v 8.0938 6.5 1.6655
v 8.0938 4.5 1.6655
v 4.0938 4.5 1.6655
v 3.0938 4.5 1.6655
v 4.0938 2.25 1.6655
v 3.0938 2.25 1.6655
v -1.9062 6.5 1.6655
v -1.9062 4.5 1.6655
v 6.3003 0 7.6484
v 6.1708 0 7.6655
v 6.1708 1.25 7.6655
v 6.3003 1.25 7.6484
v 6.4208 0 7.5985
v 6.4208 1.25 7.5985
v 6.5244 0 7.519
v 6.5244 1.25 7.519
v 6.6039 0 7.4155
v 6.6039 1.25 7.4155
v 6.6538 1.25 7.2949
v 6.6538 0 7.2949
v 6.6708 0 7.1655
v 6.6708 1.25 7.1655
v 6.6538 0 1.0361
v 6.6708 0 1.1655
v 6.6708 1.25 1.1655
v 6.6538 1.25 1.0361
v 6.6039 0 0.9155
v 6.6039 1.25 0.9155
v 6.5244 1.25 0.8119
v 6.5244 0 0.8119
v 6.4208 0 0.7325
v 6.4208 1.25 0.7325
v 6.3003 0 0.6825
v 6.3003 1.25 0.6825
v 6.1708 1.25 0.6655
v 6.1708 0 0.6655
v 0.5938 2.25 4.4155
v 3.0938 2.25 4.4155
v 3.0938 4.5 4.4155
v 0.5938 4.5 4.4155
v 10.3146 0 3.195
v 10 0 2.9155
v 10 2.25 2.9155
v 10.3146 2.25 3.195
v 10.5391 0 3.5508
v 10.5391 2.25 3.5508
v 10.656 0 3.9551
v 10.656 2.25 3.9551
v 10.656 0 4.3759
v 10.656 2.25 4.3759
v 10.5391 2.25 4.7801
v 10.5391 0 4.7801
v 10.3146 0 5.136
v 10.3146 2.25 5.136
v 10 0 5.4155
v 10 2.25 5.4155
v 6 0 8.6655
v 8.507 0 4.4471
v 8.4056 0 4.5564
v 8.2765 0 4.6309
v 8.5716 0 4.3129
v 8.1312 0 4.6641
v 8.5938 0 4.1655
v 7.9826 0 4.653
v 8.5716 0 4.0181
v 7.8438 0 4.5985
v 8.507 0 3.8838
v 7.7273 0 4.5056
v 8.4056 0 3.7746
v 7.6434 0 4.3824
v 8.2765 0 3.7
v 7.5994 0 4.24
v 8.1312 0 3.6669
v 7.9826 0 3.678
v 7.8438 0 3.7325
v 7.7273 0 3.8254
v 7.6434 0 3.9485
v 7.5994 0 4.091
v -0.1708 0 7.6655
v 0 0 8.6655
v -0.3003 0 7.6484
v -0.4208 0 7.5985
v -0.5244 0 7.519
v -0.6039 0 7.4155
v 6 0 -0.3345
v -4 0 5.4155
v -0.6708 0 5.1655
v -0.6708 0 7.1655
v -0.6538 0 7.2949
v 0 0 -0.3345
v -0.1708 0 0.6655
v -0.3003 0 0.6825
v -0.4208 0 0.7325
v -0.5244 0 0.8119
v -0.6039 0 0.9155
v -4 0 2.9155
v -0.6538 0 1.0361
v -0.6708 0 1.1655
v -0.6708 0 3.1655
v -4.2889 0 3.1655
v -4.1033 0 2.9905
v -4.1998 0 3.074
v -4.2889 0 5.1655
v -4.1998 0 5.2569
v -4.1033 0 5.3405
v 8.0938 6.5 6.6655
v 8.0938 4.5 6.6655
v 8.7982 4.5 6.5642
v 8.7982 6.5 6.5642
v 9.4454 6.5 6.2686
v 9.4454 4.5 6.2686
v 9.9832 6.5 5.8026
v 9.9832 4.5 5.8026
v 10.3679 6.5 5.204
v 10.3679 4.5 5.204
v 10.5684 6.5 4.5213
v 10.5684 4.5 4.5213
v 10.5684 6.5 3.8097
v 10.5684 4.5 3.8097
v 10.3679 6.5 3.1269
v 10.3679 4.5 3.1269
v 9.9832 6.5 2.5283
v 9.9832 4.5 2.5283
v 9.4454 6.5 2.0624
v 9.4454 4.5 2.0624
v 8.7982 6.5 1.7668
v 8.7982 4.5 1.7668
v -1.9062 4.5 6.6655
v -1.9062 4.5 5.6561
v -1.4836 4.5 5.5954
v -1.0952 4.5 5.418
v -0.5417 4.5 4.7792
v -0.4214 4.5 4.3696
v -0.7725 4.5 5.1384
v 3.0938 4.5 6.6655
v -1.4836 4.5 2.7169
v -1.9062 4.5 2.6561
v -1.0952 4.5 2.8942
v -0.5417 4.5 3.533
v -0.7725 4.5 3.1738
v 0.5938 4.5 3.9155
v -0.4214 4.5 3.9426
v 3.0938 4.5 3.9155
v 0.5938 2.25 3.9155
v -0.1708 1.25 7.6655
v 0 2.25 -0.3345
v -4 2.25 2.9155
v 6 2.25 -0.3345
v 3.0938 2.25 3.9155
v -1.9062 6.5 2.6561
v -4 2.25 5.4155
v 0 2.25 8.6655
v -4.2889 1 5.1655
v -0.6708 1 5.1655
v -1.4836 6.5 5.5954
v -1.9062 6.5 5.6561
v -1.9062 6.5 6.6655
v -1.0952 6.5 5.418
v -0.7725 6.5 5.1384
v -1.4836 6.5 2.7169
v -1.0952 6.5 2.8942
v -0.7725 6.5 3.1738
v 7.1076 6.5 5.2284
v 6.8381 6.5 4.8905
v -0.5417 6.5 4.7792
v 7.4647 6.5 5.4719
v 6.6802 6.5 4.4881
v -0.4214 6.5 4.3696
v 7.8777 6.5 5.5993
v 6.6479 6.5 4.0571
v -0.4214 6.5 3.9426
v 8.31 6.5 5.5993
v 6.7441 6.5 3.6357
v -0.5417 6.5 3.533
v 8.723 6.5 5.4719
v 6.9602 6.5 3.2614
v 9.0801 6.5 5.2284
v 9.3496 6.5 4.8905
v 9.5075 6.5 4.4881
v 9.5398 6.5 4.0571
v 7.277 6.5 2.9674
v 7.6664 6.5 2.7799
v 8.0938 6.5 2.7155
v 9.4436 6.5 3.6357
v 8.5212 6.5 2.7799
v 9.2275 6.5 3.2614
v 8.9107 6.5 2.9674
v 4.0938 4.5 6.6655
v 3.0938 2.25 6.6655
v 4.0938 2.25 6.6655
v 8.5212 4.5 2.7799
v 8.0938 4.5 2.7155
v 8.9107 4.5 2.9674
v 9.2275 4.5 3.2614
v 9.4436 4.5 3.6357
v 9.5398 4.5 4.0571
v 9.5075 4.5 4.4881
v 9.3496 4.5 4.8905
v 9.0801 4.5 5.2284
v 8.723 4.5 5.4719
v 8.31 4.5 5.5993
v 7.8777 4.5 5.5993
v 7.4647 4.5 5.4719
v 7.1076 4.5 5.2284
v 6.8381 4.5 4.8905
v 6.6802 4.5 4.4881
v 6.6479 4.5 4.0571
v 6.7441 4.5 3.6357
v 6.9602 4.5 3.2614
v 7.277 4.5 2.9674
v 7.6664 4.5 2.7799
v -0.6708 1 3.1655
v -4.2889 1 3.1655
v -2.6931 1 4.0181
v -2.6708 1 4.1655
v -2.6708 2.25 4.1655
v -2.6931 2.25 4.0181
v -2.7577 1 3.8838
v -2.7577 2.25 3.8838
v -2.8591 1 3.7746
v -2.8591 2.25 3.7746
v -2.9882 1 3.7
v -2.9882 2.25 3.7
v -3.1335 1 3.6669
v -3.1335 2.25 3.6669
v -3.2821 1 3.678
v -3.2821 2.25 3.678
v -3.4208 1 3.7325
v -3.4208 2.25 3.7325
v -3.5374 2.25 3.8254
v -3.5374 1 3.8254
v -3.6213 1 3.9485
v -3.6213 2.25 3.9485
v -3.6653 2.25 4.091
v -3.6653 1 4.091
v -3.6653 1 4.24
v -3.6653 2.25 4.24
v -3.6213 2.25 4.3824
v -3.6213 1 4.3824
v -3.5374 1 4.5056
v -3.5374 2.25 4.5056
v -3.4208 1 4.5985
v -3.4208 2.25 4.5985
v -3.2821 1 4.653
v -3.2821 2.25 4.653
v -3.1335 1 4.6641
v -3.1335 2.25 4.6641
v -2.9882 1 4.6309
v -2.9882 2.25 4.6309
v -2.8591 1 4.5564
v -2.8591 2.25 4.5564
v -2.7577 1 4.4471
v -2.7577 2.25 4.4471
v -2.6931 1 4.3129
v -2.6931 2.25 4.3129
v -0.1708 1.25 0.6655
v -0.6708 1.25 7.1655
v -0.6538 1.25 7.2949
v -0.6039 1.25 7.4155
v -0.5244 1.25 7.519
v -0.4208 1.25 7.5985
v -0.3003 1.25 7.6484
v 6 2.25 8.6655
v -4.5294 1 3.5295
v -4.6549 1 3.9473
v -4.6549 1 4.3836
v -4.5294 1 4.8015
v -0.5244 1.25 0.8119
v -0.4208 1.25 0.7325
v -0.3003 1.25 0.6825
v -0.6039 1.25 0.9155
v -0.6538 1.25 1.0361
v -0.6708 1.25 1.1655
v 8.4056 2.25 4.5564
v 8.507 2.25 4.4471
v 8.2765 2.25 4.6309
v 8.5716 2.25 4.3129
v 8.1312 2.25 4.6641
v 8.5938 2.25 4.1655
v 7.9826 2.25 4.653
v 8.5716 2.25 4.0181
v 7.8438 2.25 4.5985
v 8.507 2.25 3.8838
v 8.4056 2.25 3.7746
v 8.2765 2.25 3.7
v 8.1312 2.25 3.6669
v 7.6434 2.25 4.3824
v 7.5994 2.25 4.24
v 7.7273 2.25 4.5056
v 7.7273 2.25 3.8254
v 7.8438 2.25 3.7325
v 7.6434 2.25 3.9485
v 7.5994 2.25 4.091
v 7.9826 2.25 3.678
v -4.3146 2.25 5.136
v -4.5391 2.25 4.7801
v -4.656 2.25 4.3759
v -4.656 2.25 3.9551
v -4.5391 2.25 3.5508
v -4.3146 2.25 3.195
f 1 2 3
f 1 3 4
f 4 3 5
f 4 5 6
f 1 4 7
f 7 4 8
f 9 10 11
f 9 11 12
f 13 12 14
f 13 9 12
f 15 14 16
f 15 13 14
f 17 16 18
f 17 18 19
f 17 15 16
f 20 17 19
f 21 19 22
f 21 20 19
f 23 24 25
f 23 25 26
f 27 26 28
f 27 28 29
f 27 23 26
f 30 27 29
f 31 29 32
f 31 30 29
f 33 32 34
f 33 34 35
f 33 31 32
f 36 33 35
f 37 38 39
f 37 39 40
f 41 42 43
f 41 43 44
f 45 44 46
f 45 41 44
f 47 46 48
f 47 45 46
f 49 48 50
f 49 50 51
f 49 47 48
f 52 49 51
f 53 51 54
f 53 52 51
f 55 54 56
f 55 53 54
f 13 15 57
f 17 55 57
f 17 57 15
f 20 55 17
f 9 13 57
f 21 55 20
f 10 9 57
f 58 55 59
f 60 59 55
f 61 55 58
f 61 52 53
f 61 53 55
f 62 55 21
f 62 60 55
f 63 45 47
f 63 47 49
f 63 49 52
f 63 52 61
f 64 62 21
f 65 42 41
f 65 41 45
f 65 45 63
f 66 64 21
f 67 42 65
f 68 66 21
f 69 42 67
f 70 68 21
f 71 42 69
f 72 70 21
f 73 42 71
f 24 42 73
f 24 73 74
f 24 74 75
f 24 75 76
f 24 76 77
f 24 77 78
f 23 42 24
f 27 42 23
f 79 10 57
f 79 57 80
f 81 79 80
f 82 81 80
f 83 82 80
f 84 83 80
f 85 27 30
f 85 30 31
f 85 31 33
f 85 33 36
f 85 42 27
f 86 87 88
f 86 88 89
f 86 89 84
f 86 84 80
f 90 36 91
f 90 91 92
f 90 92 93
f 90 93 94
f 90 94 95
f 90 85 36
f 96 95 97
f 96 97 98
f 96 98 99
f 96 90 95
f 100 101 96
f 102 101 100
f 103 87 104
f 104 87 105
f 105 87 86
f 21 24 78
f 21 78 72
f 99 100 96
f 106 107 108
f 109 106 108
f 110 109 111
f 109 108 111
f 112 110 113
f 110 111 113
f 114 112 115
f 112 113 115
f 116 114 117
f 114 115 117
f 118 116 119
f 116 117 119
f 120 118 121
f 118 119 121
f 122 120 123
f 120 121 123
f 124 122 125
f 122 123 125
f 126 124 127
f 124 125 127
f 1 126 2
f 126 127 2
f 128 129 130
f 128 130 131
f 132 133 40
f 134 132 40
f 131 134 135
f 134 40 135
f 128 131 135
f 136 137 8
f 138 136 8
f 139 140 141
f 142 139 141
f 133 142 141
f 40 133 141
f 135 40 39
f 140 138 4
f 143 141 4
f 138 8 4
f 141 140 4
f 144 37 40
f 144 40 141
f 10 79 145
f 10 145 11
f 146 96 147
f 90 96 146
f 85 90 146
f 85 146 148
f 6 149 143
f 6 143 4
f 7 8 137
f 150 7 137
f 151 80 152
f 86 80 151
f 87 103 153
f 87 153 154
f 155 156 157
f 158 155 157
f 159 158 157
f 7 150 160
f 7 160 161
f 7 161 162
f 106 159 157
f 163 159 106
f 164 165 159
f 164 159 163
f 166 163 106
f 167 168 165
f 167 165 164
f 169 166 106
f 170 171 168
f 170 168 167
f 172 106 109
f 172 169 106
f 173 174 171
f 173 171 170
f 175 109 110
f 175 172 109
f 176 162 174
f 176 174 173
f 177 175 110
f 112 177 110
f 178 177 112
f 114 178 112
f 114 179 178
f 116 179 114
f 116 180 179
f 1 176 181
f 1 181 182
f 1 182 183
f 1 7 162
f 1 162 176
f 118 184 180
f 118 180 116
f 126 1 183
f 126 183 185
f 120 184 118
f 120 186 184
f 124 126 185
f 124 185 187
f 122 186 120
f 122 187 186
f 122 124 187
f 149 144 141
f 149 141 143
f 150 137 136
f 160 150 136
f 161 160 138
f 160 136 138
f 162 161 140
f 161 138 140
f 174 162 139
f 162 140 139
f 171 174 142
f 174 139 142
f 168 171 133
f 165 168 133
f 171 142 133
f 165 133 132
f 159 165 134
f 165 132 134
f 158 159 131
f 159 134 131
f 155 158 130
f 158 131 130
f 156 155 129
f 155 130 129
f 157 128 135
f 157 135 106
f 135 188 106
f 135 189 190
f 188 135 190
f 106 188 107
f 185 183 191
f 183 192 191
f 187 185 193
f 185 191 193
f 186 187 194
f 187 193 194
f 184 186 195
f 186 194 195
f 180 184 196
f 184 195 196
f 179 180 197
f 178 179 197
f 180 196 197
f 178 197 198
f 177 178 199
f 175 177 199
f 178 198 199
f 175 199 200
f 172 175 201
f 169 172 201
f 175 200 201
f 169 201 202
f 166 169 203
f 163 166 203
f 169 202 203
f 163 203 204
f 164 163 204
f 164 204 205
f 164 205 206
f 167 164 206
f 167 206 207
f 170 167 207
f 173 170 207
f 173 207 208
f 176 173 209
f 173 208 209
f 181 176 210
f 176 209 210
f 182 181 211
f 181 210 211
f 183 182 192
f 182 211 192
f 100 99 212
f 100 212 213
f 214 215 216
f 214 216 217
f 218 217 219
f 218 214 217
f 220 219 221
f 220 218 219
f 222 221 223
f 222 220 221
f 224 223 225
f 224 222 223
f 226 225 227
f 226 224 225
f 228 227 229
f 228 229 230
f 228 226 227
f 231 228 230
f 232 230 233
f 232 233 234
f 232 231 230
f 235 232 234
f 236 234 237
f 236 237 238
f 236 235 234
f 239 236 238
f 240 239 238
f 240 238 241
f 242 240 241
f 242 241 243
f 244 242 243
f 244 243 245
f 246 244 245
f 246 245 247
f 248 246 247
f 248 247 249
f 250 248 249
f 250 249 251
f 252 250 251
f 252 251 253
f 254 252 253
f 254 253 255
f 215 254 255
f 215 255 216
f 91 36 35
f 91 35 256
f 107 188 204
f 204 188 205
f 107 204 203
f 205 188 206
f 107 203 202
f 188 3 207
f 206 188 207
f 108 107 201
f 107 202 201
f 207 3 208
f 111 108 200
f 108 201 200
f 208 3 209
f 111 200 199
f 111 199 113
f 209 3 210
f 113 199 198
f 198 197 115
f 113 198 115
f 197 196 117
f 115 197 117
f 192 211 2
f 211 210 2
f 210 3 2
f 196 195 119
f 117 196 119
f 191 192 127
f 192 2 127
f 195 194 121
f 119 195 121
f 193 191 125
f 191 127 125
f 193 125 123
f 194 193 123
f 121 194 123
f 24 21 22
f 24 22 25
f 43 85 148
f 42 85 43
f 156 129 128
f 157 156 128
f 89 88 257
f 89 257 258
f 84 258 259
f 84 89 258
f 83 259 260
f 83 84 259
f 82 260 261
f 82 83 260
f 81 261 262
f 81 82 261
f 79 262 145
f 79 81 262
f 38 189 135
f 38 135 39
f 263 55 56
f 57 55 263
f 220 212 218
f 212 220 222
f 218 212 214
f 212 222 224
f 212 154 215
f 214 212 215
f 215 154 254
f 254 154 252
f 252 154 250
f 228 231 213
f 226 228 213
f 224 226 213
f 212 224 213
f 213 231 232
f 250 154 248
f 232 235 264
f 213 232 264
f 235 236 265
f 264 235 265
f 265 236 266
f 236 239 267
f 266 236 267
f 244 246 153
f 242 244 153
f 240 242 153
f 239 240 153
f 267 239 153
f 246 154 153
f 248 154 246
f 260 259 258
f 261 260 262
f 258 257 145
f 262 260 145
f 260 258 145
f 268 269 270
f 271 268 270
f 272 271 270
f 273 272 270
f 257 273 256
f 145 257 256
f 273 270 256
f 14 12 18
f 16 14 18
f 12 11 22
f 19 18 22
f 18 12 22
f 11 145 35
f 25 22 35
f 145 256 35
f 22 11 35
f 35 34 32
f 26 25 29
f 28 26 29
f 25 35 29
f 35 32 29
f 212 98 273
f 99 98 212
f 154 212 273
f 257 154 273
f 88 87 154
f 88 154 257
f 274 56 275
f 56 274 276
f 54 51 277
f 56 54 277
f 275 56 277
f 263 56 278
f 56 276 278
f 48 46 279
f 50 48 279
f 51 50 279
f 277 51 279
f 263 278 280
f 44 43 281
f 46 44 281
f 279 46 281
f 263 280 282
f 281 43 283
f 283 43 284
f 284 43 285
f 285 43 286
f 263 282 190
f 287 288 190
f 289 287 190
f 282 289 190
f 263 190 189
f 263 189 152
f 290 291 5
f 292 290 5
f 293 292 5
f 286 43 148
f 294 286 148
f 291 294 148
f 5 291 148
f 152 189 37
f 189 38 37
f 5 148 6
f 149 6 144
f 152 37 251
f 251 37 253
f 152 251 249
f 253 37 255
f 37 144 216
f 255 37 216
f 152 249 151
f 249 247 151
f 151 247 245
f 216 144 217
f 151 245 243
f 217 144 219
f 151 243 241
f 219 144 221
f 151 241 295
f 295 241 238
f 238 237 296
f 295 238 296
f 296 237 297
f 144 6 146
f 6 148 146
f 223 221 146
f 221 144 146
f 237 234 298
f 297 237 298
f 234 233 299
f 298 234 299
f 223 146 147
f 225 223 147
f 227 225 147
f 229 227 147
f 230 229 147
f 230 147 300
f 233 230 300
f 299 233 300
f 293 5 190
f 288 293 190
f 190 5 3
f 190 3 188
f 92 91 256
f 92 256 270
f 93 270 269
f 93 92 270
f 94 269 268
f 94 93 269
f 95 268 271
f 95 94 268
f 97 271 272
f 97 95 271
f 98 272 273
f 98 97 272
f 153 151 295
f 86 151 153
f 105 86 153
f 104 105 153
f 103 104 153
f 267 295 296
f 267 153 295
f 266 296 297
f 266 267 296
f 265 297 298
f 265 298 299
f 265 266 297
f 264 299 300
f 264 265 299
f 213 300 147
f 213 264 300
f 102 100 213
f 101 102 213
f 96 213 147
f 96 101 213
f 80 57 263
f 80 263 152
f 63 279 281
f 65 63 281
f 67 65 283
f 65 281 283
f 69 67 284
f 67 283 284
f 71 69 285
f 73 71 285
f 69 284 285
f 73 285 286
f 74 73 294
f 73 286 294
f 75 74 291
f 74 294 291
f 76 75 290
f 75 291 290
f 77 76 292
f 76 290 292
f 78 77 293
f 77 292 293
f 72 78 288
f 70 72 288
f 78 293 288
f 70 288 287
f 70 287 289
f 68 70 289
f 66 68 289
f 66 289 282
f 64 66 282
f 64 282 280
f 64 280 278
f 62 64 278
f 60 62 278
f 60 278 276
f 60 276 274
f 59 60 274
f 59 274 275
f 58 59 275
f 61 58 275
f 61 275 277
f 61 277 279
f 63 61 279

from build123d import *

# Parameters (mm, degrees)
SKETCH1_R               = 0.5
BOSS_EXTRUDE1_DEPTH     = 2.25
CUT_EXTRUDE3_DEPTH      = 1
CUT_EXTRUDE4_DEPTH      = 1.25
BOSS_EXTRUDE2_DEPTH     = 2.25
SKETCH7_R               = 1
BOSS_EXTRUDE3_DEPTH     = 2
SKETCH8_R               = 0.5
CUT_EXTRUDE5_DEPTH      = 3
M3_5_TAPPED_HOLE1_D     = 2.9
M3_5_TAPPED_HOLE1_DEPTH = 2
M3_5_TAPPED_HOLE1_TIP   = 0.871247898


with BuildPart() as part:
    # Sketch1 → Boss-Extrude1 (new body)
    with BuildSketch(Plane(origin=(0, 0, -0.343889451), x_dir=(1, 0, 0), z_dir=(0, 1, 0))):
        with BuildLine():
            Line((0, -0.009375659), (6, -0.009375659))
            Line((6, -0.009375659), (10, -3.259375659))
            ThreePointArc((10, -3.259375659), (10.670843802, -4.509375659), (10, -5.759375659))
            Line((10, -5.759375659), (6, -9.009375659))
            Line((6, -9.009375659), (0, -9.009375659))
            Line((0, -9.009375659), (-4, -5.759375659))
            ThreePointArc((-4, -5.759375659), (-4.670843802, -4.509375659), (-4, -3.259375659))
            Line((-4, -3.259375659), (0, -0.009375659))
        make_face()
        with Locations((-3.170843802, -4.509375659)):
            Circle(SKETCH1_R, mode=Mode.SUBTRACT)
    extrude(amount=BOSS_EXTRUDE1_DEPTH)

    # Sketch4 → Cut-Extrude3 (cut)
    with BuildSketch(Plane.XZ):
        with BuildLine():
            Line((-4.288877791, 5.165486209), (-0.670843802, 5.165486209))
            Line((-0.670843802, 5.165486209), (-0.670843802, 3.165486209))
            Line((-0.670843802, 3.165486209), (-4.288877791, 3.165486209))
            ThreePointArc((-4.288877791, 3.165486209), (-4.670843802, 4.165486209), (-4.288877791, 5.165486209))
        make_face()
    extrude(amount=-CUT_EXTRUDE3_DEPTH, mode=Mode.SUBTRACT)

    # Sketch5 → Cut-Extrude4 (cut)
    with BuildSketch(Plane(origin=(0, 0, 0), x_dir=(-1, 0, 0), z_dir=(0, -1, 0))):
        with BuildLine():
            Line((0.170843802, -7.665486209), (-6.170843802, -7.665486209))
            ThreePointArc((-6.170843802, -7.665486209), (-6.524397193, -7.519039599), (-6.670843802, -7.165486209))
            Line((-6.670843802, -7.165486209), (-6.670843802, -1.165486209))
            ThreePointArc((-6.670843802, -1.165486209), (-6.524397193, -0.811932818), (-6.170843802, -0.665486209))
            Line((-6.170843802, -0.665486209), (0.170843802, -0.665486209))
            ThreePointArc((0.170843802, -0.665486209), (0.524397193, -0.811932818), (0.670843802, -1.165486209))
            Line((0.670843802, -1.165486209), (0.670843802, -7.165486209))
            ThreePointArc((0.670843802, -7.165486209), (0.524397193, -7.519039599), (0.170843802, -7.665486209))
        make_face()
    extrude(amount=-CUT_EXTRUDE4_DEPTH, mode=Mode.SUBTRACT)

    # Sketch6 → Boss-Extrude2 (add)
    with BuildSketch(Plane(origin=(0, 2.25, 0), x_dir=(1, 0, 0), z_dir=(0, 1, 0))):
        Polygon((0.593843358, -3.915486209), (3.093843358, -3.915486209), (3.093843358, -1.665486209), (4.093843358, -1.665486209), (4.093843358, -6.665486209), (3.093843358, -6.665486209), (3.093843358, -4.415486209), (0.593843358, -4.415486209), align=None)
    extrude(amount=BOSS_EXTRUDE2_DEPTH)

    # Sketch7 → Boss-Extrude3 (add)
    with BuildSketch(Plane(origin=(0, 4.5, 0), x_dir=(1, 0, 0), z_dir=(0, 1, 0))):
        with BuildLine():
            Line((-1.906156642, -1.665486209), (-1.906156642, -2.656110549))
            ThreePointArc((-1.906156642, -2.656110549), (-0.406156642, -4.156110549), (-1.906156642, -5.656110549))
            Line((-1.906156642, -5.656110549), (-1.906156642, -6.665486209))
            Line((-1.906156642, -6.665486209), (8.093843358, -6.665486209))
            ThreePointArc((8.093843358, -6.665486209), (10.593843358, -4.165486209), (8.093843358, -1.665486209))
            Line((8.093843358, -1.665486209), (-1.906156642, -1.665486209))
        make_face()
        with Locations((8.093843358, -4.165486209)):
            Circle(SKETCH7_R, mode=Mode.SUBTRACT)
    extrude(amount=BOSS_EXTRUDE3_DEPTH)

    # Sketch8 → Cut-Extrude5 (cut)
    with BuildSketch(Plane(origin=(0, 2.25, 0), x_dir=(1, 0, 0), z_dir=(0, 1, 0))):
        with Locations((8.093843358, -4.165486209)):
            Circle(SKETCH8_R)
    extrude(amount=-CUT_EXTRUDE5_DEPTH, mode=Mode.SUBTRACT)

    # M3.5 Tapped Hole1
    with Locations(Plane(origin=(8.093843358, 6.5, 4.165486209), x_dir=(0, 0, 1), z_dir=(0, 1, 0))):
        with Locations((0, 0)):
            Hole(M3_5_TAPPED_HOLE1_D / 2, depth=M3_5_TAPPED_HOLE1_DEPTH)
            with Locations((0, 0, -(M3_5_TAPPED_HOLE1_DEPTH + M3_5_TAPPED_HOLE1_TIP / 2))):  # 118° drill point
                Cone(0, M3_5_TAPPED_HOLE1_D / 2, M3_5_TAPPED_HOLE1_TIP, mode=Mode.SUBTRACT)


solid = part.part
